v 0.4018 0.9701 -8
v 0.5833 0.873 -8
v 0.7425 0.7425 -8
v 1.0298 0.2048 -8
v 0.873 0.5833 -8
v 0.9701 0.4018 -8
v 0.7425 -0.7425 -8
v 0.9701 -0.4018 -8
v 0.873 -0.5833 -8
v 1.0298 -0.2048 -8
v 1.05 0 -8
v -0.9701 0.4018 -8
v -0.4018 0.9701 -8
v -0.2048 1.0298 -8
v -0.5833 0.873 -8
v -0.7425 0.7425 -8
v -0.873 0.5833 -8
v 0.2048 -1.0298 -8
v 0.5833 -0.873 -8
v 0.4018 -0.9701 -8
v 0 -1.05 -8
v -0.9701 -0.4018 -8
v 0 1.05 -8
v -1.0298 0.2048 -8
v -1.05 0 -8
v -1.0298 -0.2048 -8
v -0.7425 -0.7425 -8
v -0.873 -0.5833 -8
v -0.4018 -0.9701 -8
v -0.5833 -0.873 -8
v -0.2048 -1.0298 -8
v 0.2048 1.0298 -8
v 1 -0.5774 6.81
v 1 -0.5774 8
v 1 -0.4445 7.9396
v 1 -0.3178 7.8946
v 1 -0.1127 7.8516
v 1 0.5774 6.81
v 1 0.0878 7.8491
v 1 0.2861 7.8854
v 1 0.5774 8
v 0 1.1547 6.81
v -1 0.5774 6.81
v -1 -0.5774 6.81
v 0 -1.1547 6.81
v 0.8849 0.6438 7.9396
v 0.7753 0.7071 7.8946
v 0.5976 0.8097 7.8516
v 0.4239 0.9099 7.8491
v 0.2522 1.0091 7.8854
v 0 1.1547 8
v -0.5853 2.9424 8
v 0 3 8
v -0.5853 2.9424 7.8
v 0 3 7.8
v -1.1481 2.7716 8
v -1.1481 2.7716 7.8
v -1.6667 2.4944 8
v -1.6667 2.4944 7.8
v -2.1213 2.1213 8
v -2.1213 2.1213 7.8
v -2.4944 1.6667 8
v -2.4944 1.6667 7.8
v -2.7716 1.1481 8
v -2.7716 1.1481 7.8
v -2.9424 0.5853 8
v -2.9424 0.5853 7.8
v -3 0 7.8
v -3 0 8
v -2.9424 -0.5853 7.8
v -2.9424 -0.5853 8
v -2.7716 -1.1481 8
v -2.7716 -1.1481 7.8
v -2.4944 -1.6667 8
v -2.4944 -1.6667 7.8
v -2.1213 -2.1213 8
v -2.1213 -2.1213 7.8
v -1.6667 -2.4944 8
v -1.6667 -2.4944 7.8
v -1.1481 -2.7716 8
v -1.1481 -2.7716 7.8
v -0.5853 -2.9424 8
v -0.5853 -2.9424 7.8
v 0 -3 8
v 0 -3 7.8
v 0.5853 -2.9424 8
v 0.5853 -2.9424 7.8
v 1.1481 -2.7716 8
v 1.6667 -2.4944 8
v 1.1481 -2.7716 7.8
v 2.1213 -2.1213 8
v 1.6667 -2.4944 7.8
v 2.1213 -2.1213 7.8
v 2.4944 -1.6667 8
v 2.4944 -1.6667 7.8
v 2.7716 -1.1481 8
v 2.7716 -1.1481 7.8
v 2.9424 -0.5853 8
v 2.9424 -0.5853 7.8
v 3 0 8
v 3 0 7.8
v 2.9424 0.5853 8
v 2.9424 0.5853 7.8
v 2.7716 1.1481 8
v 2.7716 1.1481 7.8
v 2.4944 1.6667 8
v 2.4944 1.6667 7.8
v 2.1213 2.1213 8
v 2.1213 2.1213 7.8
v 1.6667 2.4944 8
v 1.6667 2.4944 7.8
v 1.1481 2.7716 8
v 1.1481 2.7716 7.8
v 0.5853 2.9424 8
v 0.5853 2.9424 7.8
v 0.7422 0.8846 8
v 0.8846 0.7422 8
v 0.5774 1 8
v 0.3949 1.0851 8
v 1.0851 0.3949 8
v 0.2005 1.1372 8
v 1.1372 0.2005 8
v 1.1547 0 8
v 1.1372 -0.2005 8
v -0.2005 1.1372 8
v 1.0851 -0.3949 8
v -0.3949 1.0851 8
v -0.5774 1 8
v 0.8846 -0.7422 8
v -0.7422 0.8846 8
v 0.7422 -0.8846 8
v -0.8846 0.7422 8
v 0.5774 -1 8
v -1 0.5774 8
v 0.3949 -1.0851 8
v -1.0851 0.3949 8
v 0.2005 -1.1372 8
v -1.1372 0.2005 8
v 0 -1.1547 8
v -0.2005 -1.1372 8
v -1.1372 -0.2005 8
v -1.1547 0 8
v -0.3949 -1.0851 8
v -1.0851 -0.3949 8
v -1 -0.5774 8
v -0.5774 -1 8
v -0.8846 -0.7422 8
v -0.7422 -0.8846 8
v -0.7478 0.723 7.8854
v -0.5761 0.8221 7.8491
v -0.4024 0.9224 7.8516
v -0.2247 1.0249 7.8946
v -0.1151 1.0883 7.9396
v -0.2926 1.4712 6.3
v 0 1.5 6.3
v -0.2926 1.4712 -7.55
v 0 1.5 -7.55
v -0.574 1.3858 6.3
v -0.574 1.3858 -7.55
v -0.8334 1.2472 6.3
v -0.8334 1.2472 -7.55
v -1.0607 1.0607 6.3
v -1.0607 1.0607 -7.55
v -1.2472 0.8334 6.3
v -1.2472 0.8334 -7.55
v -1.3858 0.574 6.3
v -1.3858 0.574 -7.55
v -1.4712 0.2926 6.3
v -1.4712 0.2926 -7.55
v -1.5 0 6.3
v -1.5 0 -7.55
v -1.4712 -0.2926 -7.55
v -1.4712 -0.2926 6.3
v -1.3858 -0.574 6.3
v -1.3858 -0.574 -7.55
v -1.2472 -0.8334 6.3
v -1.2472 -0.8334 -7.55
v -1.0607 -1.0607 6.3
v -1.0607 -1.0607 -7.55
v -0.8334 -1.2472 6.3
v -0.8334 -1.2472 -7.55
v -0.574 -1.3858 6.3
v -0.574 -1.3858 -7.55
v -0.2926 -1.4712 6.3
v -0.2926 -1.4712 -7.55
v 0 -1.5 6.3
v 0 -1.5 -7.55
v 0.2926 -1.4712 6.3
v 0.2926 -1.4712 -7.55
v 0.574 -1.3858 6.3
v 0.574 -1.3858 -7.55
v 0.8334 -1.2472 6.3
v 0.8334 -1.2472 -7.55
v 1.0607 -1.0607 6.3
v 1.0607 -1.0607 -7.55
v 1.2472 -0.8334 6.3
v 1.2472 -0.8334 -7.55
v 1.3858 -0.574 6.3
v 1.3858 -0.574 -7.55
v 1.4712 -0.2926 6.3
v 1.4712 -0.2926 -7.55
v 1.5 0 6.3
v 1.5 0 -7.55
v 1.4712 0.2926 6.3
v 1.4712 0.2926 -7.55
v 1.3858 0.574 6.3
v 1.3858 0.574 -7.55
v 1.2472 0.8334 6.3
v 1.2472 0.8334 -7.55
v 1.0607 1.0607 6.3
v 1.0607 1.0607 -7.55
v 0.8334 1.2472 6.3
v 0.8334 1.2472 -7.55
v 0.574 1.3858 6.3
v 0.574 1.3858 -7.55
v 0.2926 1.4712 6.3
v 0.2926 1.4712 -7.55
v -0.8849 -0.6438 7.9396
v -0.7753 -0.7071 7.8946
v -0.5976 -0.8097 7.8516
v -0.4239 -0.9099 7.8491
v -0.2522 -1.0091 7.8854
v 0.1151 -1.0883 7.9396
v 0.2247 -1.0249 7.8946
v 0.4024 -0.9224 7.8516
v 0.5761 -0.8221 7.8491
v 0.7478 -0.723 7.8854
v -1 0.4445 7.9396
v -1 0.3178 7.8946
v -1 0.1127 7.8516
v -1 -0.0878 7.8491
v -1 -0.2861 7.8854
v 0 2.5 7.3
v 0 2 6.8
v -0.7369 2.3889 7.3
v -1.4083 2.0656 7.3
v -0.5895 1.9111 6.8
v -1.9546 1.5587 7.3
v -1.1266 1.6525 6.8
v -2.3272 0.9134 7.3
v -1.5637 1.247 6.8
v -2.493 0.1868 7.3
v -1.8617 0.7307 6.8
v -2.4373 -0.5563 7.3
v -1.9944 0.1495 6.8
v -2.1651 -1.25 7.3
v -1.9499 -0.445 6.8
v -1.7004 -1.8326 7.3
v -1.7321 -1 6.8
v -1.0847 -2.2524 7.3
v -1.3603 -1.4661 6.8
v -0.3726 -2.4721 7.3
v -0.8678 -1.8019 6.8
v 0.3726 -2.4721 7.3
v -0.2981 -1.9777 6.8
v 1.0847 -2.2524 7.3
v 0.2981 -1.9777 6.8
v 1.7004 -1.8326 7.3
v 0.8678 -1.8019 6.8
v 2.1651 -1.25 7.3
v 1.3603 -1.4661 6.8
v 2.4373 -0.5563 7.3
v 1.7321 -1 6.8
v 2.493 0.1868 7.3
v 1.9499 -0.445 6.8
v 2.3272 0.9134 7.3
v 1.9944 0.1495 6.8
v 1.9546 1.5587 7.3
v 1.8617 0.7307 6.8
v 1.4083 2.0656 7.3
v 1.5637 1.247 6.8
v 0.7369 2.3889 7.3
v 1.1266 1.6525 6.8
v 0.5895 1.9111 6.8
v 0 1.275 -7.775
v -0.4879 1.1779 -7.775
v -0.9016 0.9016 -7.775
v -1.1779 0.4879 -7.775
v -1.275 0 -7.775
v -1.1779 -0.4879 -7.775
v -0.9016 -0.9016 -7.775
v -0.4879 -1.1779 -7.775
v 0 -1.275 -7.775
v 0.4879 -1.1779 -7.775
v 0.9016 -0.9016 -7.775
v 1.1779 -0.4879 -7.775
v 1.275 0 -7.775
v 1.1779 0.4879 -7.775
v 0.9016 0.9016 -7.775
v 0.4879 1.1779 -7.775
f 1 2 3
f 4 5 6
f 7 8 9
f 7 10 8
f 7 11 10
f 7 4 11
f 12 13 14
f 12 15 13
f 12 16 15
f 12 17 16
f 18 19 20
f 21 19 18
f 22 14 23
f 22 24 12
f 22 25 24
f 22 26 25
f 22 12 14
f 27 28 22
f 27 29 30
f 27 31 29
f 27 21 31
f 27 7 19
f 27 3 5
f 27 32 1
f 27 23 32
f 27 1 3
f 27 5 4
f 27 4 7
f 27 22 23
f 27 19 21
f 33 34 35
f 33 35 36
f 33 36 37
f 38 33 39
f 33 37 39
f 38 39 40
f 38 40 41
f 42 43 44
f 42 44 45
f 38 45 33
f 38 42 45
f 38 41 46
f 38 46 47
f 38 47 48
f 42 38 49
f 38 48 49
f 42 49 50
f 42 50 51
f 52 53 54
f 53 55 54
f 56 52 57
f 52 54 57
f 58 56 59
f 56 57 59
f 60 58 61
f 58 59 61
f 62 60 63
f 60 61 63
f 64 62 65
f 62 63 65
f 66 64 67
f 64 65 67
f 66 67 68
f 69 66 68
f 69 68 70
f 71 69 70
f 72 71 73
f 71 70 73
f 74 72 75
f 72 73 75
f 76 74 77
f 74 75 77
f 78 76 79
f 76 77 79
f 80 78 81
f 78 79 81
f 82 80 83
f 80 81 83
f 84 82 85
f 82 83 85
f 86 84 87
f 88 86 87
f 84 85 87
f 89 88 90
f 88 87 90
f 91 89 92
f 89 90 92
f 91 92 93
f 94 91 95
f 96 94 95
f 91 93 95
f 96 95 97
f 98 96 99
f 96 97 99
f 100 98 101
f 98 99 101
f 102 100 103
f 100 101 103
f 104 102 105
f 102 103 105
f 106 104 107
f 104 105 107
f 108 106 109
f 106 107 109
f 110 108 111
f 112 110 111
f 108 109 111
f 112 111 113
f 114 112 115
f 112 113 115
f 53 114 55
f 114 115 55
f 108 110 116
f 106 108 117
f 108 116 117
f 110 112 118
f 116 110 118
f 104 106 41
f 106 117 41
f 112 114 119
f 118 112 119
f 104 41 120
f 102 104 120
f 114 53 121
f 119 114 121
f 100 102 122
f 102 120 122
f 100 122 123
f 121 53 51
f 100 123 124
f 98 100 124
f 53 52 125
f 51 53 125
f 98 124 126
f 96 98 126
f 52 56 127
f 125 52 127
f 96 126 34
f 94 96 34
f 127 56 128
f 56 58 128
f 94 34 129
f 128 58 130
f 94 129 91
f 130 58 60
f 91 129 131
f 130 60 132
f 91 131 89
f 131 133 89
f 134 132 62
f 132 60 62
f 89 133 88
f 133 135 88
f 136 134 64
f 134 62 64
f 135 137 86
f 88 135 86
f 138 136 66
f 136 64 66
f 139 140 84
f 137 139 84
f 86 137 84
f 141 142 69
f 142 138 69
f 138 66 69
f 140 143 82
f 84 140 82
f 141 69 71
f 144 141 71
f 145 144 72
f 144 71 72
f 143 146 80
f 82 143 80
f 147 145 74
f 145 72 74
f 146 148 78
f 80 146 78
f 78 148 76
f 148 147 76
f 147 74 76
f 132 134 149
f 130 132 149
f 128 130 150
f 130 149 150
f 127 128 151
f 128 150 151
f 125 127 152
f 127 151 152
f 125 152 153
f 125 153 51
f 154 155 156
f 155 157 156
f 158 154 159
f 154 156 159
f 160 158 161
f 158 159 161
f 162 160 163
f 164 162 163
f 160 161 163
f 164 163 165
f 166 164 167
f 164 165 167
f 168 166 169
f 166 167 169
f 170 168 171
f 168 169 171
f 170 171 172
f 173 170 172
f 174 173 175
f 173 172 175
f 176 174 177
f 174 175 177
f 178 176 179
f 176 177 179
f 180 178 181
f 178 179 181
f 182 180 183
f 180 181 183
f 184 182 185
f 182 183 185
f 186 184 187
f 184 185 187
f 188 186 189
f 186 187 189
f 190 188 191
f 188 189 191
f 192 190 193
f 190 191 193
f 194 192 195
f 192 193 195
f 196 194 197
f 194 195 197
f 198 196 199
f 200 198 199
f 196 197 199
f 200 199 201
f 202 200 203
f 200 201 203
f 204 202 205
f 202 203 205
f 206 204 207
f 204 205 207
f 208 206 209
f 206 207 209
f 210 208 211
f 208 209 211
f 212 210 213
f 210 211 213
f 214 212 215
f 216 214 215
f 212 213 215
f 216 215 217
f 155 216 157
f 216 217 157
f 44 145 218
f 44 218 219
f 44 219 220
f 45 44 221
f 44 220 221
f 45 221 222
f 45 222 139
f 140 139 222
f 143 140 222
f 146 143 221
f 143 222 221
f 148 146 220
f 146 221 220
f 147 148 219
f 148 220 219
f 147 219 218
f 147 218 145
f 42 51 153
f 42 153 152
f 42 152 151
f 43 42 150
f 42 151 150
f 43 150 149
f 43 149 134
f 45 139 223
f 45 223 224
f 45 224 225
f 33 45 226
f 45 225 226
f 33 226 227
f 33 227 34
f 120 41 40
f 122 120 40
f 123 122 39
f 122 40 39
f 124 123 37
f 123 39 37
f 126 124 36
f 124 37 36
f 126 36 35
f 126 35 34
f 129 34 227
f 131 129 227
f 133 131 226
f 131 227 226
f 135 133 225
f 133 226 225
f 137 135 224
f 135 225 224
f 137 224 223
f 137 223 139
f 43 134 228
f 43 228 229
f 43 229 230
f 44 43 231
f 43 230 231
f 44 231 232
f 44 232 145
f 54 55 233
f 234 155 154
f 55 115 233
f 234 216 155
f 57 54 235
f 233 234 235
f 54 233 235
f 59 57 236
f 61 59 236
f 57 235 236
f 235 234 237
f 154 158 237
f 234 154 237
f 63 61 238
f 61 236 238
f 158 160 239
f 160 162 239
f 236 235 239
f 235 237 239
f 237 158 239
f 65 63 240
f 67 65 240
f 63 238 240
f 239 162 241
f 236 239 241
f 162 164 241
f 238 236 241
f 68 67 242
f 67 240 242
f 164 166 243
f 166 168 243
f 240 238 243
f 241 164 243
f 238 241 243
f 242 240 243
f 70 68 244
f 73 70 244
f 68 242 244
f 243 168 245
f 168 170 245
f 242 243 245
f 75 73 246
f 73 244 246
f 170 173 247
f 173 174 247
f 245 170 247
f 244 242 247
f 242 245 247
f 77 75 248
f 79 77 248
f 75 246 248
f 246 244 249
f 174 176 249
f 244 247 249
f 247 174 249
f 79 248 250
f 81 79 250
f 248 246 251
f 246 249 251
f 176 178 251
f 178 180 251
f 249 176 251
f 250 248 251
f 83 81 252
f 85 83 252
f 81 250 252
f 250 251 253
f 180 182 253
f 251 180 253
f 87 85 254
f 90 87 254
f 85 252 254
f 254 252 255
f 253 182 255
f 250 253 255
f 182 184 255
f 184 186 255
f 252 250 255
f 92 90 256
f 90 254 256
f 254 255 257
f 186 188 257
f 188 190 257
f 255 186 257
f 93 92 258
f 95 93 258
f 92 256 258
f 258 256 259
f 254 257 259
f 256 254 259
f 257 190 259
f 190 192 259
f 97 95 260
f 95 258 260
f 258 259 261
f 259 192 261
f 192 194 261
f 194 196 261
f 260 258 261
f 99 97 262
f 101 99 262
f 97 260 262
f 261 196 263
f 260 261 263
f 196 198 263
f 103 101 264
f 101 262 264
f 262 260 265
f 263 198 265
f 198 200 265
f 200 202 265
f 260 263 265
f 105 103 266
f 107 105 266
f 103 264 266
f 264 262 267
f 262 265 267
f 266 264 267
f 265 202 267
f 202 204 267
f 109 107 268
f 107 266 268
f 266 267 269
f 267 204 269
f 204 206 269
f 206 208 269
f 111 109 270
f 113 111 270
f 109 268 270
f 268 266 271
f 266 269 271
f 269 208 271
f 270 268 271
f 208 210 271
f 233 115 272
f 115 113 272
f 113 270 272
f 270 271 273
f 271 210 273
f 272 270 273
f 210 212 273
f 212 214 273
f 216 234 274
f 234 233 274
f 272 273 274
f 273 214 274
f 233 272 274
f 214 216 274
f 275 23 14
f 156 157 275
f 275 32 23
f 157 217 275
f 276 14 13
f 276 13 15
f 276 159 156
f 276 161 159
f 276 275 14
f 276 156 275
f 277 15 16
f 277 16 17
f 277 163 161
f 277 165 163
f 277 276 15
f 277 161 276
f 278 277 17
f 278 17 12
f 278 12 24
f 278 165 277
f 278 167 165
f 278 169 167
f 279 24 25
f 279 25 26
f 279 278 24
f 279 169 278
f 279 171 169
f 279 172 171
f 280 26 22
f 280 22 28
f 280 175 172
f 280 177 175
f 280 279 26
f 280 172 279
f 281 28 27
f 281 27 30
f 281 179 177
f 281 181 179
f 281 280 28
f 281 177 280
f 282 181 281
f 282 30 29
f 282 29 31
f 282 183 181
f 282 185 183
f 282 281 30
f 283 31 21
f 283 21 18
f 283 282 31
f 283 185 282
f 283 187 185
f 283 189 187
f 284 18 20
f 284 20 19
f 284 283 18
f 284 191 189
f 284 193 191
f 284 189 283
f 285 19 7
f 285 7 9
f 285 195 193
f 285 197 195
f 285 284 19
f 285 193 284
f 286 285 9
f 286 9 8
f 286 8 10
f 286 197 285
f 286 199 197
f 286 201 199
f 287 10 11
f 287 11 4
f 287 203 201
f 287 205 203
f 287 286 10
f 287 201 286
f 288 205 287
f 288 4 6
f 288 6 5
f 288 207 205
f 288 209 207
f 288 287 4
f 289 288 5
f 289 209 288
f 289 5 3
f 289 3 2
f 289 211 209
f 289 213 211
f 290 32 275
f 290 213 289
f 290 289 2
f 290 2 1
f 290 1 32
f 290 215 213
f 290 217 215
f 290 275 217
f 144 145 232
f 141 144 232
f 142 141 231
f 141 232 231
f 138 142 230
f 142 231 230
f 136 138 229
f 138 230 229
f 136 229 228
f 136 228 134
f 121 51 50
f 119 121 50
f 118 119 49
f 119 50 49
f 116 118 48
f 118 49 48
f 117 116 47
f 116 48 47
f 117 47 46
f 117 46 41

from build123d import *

# Parameters (mm, degrees)
SKETCH3_W          = 16
SKETCH3_H          = 1.5
CHAMFER1_SIZE      = 0.45
CUT_EXTRUDE1_DEPTH = 1.19


with BuildPart() as part:
    # Sketch3 → Revolve1 (revolve)
    with BuildSketch(Plane(origin=(0, 0, 0), x_dir=(0, 0, -1), z_dir=(1, 0, 0))):
        with Locations((0, 0.75)):
            Rectangle(SKETCH3_W, SKETCH3_H)
    revolve(axis=Axis((0, 0, -8), (0, 0, 1)))

    # Chamfer1
    chamfer1_edges = [part.edges().sort_by_distance(p)[0] for p in [
        (0, -1.5, -8),
    ]]
    chamfer(chamfer1_edges, length=CHAMFER1_SIZE)

    # Sketch6 → Revolve2 (revolve)
    with BuildSketch(Plane(origin=(0, 0, 0), x_dir=(0, 0, -1), z_dir=(1, 0, 0))):
        Polygon((-8, 3), (-7.8, 3), (-6.3, 1.5), (-6.3, 0), (-8, 0), align=None)
    revolve(axis=Axis((0, 0, -8), (0, 0, 1)))

    # Sketch8 → Cut-Extrude1 (cut)
    with BuildSketch(Plane.XY.offset(8)):
        Polygon((0, 1.154700538), (-1, 0.577350269), (-1, -0.577350269), (0, -1.154700538), (1, -0.577350269), (1, 0.577350269), align=None)
    extrude(amount=-CUT_EXTRUDE1_DEPTH, mode=Mode.SUBTRACT)

    # Cut-Extrude2 cone 1 section (through the dimple's axis) → Cut-Extrude2 (revolve, cut)
    with BuildSketch(Plane(origin=(0, 0, 8), x_dir=(0, -1, 0), z_dir=(1, 0, 0))):
        Polygon((0, 0), (1.154700538, 0), (0, 1.154700538), align=None)
    revolve(axis=Axis((0, 0, 8), (0, 0, -1)), mode=Mode.SUBTRACT)


solid = part.part
